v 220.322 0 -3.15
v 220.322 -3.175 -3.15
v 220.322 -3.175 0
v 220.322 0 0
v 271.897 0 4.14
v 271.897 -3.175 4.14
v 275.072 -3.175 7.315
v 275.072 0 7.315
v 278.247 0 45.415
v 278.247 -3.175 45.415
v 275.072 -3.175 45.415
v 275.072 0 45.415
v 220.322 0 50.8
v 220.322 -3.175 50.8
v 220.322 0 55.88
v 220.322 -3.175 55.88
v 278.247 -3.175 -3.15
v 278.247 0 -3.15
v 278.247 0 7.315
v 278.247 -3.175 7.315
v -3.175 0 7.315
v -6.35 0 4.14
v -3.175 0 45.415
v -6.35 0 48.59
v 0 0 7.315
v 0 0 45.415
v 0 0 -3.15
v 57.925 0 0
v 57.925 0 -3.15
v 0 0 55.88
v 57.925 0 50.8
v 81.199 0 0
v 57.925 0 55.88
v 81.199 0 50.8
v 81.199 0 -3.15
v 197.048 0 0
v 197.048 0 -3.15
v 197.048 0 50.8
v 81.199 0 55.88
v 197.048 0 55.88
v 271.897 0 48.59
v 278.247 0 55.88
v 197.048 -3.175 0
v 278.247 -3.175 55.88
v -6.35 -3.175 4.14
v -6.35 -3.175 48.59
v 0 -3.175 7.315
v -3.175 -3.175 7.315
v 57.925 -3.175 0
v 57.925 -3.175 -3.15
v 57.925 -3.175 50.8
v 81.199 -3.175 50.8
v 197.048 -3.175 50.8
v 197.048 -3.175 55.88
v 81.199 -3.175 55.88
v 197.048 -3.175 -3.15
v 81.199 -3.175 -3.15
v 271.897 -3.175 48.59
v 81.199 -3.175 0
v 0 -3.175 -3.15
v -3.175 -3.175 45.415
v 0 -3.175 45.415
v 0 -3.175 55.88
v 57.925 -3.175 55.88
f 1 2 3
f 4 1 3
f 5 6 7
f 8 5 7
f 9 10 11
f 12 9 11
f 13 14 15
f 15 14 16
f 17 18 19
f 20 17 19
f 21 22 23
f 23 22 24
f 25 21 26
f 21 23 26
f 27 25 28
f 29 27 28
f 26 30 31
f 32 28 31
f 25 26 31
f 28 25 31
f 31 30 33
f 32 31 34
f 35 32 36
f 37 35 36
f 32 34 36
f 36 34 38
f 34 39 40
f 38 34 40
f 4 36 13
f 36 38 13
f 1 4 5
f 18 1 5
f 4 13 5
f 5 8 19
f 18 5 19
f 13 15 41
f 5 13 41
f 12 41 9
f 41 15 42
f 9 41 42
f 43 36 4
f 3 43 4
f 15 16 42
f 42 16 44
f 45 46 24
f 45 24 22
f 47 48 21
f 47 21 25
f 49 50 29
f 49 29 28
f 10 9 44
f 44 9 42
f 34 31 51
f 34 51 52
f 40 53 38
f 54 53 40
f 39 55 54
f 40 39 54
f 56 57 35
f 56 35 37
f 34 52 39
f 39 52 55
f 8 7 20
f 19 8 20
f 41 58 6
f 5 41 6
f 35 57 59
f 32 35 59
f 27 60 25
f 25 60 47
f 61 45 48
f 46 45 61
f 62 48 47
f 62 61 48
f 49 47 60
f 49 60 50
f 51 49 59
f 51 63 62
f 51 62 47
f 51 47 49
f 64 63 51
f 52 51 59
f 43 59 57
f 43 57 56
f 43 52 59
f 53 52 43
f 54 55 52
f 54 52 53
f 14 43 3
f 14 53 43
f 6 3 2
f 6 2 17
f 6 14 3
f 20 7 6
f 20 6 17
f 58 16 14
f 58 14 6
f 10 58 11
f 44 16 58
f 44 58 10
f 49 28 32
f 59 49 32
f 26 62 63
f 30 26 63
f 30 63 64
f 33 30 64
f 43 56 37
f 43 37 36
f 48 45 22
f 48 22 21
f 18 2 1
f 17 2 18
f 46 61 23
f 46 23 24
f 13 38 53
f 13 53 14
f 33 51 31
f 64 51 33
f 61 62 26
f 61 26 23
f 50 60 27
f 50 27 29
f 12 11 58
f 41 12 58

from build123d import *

# Parameters (mm, degrees)
F0_W     = 278.2466876
F0_H     = 50.8
F1_DEPTH = 3.175
F2_W     = 57.9247
F2_H     = 5.08
F2_W_2   = 115.8494
F2_H_2   = 3.1496
F3_DEPTH = 3.175
F5_DEPTH = 3.175
F6_DEPTH = 3.176


with BuildPart() as f1:
    # F0 (on Front) → F1 (new body)
    with BuildSketch(Plane.XZ):
        with Locations((139.1233438, 25.4)):
            Rectangle(F0_W, F0_H)
    extrude(amount=F1_DEPTH)

    # F2 (on face) → F3 (join)
    with BuildSketch(Plane.XZ.offset(3.175)):
        with Locations((28.96235, 53.34)):
            Rectangle(F2_W, F2_H)
        with Locations((139.1233438, 53.34)):
            Rectangle(F2_W_2, F2_H)
        with Locations((249.2843376, 53.34)):
            Rectangle(F2_W, F2_H)
        with Locations((28.96235, -1.5748)):
            Rectangle(F2_W, F2_H_2)
        with Locations((139.1233438, -1.5748)):
            Rectangle(F2_W_2, F2_H_2)
        with Locations((249.2843376, -1.5748)):
            Rectangle(F2_W, F2_H_2)
    extrude(amount=-F3_DEPTH)

    # F4 (on face) → F5 (join)
    with BuildSketch(Plane.XZ.offset(3.175)):
        Polygon((0, 7.3152), (0, 45.4152), (-3.175, 45.4152), (-6.35, 48.5902), (-6.35, 4.1402), (-3.175, 7.3152), align=None)
    extrude(amount=-F5_DEPTH)

    # F4 (on face) → F6 (cut, through all)
    with BuildSketch(Plane.XZ.offset(3.175)):
        Polygon((278.2466876, 7.3152), (278.2466876, 45.4152), (275.0716876, 45.4152), (271.8966876, 48.5902), (271.8966876, 4.1402), (275.0716876, 7.3152), align=None)
    extrude(amount=-F6_DEPTH, mode=Mode.SUBTRACT)


solid = f1.part
